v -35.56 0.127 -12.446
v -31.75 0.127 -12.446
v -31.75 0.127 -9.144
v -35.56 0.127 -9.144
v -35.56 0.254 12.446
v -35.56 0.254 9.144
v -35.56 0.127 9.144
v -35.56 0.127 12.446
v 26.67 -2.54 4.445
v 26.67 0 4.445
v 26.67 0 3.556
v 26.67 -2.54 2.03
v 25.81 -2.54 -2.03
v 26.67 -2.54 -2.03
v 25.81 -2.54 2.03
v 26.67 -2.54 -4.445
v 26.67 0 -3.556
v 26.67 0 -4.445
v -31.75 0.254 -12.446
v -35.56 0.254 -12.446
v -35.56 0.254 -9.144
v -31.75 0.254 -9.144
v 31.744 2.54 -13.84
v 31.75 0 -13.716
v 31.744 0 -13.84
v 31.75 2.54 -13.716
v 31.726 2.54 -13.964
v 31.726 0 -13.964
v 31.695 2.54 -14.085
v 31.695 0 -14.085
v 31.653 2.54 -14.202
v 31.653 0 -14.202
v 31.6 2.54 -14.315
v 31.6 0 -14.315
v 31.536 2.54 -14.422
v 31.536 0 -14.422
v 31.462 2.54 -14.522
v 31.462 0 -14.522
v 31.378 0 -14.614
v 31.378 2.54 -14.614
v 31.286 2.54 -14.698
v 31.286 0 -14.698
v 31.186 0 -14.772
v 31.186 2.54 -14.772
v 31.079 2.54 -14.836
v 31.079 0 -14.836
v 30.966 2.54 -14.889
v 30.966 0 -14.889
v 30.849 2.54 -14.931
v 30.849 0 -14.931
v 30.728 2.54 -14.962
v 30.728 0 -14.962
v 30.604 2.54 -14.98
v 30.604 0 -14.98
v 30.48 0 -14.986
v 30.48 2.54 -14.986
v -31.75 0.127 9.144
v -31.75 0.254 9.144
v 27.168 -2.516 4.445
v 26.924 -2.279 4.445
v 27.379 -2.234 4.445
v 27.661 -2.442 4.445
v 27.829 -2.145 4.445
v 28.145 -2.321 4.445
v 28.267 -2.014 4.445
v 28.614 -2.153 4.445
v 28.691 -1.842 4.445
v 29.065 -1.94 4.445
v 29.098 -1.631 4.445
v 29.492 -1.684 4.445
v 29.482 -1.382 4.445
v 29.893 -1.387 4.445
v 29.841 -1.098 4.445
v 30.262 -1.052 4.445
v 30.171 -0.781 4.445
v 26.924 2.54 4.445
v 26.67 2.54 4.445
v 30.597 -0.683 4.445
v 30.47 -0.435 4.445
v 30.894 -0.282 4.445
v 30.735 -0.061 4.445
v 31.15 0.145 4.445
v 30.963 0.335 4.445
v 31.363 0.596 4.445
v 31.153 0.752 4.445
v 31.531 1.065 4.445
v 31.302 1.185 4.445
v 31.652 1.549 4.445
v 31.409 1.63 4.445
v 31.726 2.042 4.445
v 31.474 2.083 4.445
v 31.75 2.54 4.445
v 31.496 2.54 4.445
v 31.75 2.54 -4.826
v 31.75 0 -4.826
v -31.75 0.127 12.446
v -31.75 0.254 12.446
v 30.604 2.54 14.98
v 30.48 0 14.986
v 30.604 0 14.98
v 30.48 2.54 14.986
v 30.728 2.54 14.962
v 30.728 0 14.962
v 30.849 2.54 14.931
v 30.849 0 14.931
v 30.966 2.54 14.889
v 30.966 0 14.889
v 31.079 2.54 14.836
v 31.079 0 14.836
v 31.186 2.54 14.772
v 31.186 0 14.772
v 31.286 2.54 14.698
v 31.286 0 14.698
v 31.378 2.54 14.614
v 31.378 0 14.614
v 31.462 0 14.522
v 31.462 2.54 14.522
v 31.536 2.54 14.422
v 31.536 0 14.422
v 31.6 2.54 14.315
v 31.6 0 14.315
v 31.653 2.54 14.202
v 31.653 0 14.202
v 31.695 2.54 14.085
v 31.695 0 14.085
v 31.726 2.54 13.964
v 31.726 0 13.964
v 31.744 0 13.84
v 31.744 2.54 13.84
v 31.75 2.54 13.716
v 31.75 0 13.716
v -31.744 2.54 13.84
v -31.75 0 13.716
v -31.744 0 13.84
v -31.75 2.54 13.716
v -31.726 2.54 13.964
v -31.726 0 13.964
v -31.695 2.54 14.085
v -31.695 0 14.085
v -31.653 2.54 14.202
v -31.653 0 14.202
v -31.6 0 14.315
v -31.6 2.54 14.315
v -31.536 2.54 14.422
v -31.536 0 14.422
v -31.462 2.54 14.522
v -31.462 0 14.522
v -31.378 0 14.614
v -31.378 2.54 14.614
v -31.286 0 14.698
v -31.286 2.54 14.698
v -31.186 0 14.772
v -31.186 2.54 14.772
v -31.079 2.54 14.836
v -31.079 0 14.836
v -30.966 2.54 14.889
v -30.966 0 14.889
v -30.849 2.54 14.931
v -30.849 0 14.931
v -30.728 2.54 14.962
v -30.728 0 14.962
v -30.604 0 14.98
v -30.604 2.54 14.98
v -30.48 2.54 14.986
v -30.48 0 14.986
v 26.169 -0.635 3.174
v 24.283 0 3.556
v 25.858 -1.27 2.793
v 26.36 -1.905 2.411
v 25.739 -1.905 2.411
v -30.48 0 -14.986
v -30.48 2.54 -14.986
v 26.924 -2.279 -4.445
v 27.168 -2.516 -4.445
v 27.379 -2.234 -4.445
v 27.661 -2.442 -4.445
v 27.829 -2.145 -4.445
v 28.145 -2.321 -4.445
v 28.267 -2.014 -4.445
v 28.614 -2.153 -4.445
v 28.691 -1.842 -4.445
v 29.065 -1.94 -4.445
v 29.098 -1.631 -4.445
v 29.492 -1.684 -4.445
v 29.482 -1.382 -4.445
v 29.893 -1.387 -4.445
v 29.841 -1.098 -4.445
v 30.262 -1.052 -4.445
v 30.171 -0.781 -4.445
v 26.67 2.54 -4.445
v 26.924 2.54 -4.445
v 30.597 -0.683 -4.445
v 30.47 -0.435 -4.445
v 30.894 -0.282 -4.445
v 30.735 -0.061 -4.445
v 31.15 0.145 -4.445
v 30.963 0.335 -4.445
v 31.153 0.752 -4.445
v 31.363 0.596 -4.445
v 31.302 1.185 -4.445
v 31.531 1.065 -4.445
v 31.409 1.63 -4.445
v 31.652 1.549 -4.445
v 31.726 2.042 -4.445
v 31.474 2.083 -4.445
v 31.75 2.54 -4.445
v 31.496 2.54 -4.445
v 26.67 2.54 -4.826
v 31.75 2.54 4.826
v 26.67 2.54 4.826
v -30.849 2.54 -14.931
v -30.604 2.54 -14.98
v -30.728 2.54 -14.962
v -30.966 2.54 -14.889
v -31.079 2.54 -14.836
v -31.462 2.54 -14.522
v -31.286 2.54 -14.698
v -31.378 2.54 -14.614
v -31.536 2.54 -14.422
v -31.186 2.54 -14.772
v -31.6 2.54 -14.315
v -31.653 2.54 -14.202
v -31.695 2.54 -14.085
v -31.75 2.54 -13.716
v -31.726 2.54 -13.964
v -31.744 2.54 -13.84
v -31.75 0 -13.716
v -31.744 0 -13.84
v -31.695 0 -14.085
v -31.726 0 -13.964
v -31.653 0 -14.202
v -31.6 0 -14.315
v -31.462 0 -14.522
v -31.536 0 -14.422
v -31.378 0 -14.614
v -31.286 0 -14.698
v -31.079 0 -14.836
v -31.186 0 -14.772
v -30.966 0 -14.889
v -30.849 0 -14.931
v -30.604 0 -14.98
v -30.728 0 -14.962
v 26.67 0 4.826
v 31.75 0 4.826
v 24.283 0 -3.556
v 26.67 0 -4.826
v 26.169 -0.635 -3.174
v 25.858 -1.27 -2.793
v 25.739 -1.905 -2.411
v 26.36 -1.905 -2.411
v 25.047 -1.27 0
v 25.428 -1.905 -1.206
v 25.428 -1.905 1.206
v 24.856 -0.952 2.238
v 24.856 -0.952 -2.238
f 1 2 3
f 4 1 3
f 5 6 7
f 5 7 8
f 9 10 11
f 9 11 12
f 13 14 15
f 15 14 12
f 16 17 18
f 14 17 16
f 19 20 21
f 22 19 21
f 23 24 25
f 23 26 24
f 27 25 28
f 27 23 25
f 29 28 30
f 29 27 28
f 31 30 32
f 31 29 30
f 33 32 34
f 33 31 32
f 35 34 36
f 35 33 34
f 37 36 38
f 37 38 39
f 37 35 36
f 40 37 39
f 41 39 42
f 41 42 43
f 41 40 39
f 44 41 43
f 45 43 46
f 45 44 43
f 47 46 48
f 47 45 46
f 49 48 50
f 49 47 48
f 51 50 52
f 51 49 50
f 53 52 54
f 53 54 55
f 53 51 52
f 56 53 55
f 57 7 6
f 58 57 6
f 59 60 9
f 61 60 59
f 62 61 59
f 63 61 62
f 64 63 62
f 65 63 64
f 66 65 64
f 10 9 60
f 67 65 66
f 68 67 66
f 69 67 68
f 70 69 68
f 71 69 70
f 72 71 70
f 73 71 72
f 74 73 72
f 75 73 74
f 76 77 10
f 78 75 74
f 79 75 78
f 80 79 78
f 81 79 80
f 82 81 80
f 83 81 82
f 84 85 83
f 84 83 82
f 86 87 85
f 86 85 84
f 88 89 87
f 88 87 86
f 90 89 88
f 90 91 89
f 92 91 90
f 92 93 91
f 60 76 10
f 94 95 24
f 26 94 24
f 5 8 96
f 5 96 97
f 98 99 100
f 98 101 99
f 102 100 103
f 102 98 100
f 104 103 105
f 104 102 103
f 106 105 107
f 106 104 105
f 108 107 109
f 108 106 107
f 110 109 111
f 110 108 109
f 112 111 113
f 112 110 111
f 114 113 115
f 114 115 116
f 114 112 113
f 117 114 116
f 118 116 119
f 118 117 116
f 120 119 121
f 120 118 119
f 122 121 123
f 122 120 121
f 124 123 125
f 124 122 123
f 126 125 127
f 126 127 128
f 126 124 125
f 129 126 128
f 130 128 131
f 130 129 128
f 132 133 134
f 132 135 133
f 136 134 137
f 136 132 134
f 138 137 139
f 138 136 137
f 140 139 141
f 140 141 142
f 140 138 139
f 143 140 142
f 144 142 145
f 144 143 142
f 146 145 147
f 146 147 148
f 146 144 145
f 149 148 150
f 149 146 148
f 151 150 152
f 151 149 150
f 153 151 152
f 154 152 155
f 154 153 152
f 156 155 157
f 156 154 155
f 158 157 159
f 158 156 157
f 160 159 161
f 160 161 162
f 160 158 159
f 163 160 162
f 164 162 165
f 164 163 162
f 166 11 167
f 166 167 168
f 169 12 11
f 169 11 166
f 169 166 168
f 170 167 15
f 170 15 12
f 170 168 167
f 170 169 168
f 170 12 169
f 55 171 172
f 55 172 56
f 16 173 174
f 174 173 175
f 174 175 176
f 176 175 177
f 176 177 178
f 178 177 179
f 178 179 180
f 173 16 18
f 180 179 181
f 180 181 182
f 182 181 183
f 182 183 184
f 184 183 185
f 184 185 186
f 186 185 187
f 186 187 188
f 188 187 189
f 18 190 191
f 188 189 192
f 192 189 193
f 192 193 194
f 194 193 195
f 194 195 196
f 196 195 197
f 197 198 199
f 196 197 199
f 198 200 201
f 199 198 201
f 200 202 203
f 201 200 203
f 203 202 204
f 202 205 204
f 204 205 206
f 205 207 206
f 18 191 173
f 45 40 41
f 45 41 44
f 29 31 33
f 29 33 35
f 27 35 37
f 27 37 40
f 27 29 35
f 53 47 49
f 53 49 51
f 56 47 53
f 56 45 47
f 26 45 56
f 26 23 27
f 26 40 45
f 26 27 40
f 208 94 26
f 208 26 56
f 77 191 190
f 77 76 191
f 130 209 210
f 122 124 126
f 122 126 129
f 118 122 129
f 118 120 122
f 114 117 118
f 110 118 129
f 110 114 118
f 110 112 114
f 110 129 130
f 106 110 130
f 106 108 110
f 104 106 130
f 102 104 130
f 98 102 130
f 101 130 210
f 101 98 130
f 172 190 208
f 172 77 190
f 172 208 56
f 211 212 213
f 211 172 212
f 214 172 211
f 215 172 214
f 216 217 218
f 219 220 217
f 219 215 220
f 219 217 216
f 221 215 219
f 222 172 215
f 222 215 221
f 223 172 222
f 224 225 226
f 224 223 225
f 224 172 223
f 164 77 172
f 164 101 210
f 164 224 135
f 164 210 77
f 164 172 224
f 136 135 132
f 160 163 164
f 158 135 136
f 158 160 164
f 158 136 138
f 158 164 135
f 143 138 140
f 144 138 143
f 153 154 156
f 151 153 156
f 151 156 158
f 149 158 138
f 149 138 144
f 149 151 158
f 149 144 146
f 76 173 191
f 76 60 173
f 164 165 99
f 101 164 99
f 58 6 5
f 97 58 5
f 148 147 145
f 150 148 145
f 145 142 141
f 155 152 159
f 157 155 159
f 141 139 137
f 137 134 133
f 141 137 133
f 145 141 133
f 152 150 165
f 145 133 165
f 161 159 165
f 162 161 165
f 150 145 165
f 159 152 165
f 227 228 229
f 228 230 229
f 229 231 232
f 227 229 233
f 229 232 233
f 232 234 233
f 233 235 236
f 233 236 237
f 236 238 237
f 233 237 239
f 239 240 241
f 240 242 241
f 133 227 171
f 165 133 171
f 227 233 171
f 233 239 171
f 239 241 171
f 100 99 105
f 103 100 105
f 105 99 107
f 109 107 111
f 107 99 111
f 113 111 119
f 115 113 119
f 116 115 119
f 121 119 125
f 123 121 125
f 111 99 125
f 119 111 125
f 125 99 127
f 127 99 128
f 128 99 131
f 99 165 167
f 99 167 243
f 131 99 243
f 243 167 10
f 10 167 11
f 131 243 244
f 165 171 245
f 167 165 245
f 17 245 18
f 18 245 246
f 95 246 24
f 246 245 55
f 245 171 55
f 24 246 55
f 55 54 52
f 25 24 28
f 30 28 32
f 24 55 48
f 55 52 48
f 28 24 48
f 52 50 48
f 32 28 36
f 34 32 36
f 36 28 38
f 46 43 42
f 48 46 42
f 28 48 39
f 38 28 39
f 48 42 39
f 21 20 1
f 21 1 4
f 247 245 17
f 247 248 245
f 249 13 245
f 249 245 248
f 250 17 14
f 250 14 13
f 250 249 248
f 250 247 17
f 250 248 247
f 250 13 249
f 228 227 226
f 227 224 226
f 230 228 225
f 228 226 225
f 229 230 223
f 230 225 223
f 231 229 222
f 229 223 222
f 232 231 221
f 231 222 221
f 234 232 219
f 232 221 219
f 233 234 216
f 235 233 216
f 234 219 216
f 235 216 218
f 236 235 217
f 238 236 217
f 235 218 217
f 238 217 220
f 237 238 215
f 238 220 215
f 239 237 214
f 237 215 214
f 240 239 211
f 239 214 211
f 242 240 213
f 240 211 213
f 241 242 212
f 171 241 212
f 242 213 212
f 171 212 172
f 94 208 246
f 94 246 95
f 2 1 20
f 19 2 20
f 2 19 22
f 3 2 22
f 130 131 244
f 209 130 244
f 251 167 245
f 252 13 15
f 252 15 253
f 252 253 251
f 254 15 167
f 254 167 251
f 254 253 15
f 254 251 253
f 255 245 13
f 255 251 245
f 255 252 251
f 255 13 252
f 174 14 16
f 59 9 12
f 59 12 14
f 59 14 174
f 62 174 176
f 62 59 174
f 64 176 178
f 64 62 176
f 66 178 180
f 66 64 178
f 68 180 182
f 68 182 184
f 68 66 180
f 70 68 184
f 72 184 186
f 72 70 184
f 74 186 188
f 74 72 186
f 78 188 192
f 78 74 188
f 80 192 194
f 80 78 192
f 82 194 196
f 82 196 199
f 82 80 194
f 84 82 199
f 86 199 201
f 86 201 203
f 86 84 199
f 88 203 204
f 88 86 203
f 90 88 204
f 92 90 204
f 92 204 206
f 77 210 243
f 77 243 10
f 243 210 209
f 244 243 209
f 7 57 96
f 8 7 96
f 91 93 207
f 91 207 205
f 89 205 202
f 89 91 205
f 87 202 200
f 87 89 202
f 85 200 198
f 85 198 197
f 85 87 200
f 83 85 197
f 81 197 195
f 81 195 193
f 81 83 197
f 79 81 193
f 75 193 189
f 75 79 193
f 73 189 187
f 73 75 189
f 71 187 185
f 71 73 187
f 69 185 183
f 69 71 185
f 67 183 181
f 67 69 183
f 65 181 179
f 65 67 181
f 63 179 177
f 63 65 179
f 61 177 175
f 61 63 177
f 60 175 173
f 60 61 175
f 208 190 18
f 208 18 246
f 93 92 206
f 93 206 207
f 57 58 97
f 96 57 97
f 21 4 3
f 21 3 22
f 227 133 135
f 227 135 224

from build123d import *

# Parameters (mm, degrees)
SKETCH1_W             = 63.5
SKETCH1_H             = 29.972
BOSS_EXTRUDE1_DEPTH   = 2.54
FILLET1_R             = 1.27
SKETCH2_W             = 10.16
SKETCH2_H             = 9.652
CUT_EXTRUDE1_DEPTH    = 36.200771242
SKETCH3_W             = 4.773107024
SKETCH3_H             = 7.112
BOSS_EXTRUDE2_DEPTH   = 2.54
BOSS_EXTRUDE2_TAPER   = 31
SKETCH4_W             = 2.386553512
SKETCH4_H             = 7.112
CUT_EXTRUDE2_DEPTH    = 36.200771249
BOSS_EXTRUDE4_DEPTH   = 4.445
SKETCH11_W            = 3.302
SKETCH11_H            = 0.254
BOSS_EXTRUDE5_DEPTH   = 3.81
BOSS_EXTRUDE5_2_DEPTH = 3.81
SKETCH12_W            = 3.302
SKETCH12_H            = 0.127
CUT_EXTRUDE3_DEPTH    = 66.293811319


with BuildPart() as part:
    # Sketch1 → Boss-Extrude1 (new body)
    with BuildSketch(Plane(origin=(0, 0, 0), x_dir=(1, 0, 0), z_dir=(0, 1, 0))):
        Rectangle(SKETCH1_W, SKETCH1_H)
    extrude(amount=BOSS_EXTRUDE1_DEPTH)

    # Fillet1
    fillet1_edges = [part.edges().sort_by_distance(p)[0] for p in [
        (31.75, 1.27, 14.986),
        (-31.75, 1.27, 14.986),
        (-31.75, 1.27, -14.986),
        (31.75, 1.27, -14.986),
    ]]
    fillet(fillet1_edges, radius=FILLET1_R)

    # Sketch2 → Cut-Extrude1 (cut, through all)
    with BuildSketch(Plane(origin=(0, 2.54, 0), x_dir=(1, 0, 0), z_dir=(0, 1, 0))):
        with Locations((31.75, 0)):
            Rectangle(SKETCH2_W, SKETCH2_H)
    extrude(amount=-CUT_EXTRUDE1_DEPTH, mode=Mode.SUBTRACT)

    # Sketch3 → Boss-Extrude2 (add)
    with BuildSketch(Plane.XZ):
        with Locations((26.67, 0)):
            Rectangle(SKETCH3_W, SKETCH3_H)
    extrude(amount=BOSS_EXTRUDE2_DEPTH, taper=BOSS_EXTRUDE2_TAPER)

    # Sketch4 → Cut-Extrude2 (cut, through all)
    with BuildSketch(Plane(origin=(0, 0, 0), x_dir=(1, 0, 0), z_dir=(0, 1, 0))):
        with Locations((27.863276756, 0)):
            Rectangle(SKETCH4_W, SKETCH4_H)
    extrude(amount=-CUT_EXTRUDE2_DEPTH, mode=Mode.SUBTRACT)

    # Sketch10 → Boss-Extrude4 (add, symmetric)
    with BuildSketch(Plane.XY):
        with BuildLine():
            Line((26.67, 2.54), (26.67, -2.54))
            ThreePointArc((26.67, -2.54), (30.262102448, -1.052102448), (31.75, 2.54))
            Line((31.75, 2.54), (31.496, 2.54))
            ThreePointArc((31.496, 2.54), (30.171148383, -0.781480995), (26.924, -2.279311154))
            Line((26.924, -2.279311154), (26.924, 2.54))
            Line((26.924, 2.54), (26.67, 2.54))
        make_face()
    extrude(amount=BOSS_EXTRUDE4_DEPTH, both=True)


with BuildPart() as body_2:
    # Sketch11 → Boss-Extrude5 (new body)
    with BuildSketch(Plane.ZY.offset(31.75)):
        with Locations((10.795, 0.127)):
            Rectangle(SKETCH11_W, SKETCH11_H)
    extrude(amount=BOSS_EXTRUDE5_DEPTH)


with BuildPart() as body_3:
    # Sketch11 → Boss-Extrude5 2 (new body)
    with BuildSketch(Plane.ZY.offset(31.75)):
        with Locations((-10.795, 0.127)):
            Rectangle(SKETCH11_W, SKETCH11_H)
    extrude(amount=BOSS_EXTRUDE5_2_DEPTH)


with BuildPart() as cut_extrude3_tool:
    # Sketch12 → Cut-Extrude3 (new, through all)
    with BuildSketch(Plane.ZY.offset(31.75)):
        with Locations((-10.795, 0.0635)):
            Rectangle(SKETCH12_W, SKETCH12_H)
        with Locations((10.795, 0.0635)):
            Rectangle(SKETCH12_W, SKETCH12_H)
    extrude(amount=CUT_EXTRUDE3_DEPTH)


with BuildPart() as body_2_1:
    add(body_2.part)

    # Cut-Extrude3: cut by cut_extrude3_tool
    add(cut_extrude3_tool.part, mode=Mode.SUBTRACT)


with BuildPart() as body_3_1:
    add(body_3.part)

    # Cut-Extrude3: cut by cut_extrude3_tool
    add(cut_extrude3_tool.part, mode=Mode.SUBTRACT)


solid = Compound([part.part, body_2_1.part, body_3_1.part])
